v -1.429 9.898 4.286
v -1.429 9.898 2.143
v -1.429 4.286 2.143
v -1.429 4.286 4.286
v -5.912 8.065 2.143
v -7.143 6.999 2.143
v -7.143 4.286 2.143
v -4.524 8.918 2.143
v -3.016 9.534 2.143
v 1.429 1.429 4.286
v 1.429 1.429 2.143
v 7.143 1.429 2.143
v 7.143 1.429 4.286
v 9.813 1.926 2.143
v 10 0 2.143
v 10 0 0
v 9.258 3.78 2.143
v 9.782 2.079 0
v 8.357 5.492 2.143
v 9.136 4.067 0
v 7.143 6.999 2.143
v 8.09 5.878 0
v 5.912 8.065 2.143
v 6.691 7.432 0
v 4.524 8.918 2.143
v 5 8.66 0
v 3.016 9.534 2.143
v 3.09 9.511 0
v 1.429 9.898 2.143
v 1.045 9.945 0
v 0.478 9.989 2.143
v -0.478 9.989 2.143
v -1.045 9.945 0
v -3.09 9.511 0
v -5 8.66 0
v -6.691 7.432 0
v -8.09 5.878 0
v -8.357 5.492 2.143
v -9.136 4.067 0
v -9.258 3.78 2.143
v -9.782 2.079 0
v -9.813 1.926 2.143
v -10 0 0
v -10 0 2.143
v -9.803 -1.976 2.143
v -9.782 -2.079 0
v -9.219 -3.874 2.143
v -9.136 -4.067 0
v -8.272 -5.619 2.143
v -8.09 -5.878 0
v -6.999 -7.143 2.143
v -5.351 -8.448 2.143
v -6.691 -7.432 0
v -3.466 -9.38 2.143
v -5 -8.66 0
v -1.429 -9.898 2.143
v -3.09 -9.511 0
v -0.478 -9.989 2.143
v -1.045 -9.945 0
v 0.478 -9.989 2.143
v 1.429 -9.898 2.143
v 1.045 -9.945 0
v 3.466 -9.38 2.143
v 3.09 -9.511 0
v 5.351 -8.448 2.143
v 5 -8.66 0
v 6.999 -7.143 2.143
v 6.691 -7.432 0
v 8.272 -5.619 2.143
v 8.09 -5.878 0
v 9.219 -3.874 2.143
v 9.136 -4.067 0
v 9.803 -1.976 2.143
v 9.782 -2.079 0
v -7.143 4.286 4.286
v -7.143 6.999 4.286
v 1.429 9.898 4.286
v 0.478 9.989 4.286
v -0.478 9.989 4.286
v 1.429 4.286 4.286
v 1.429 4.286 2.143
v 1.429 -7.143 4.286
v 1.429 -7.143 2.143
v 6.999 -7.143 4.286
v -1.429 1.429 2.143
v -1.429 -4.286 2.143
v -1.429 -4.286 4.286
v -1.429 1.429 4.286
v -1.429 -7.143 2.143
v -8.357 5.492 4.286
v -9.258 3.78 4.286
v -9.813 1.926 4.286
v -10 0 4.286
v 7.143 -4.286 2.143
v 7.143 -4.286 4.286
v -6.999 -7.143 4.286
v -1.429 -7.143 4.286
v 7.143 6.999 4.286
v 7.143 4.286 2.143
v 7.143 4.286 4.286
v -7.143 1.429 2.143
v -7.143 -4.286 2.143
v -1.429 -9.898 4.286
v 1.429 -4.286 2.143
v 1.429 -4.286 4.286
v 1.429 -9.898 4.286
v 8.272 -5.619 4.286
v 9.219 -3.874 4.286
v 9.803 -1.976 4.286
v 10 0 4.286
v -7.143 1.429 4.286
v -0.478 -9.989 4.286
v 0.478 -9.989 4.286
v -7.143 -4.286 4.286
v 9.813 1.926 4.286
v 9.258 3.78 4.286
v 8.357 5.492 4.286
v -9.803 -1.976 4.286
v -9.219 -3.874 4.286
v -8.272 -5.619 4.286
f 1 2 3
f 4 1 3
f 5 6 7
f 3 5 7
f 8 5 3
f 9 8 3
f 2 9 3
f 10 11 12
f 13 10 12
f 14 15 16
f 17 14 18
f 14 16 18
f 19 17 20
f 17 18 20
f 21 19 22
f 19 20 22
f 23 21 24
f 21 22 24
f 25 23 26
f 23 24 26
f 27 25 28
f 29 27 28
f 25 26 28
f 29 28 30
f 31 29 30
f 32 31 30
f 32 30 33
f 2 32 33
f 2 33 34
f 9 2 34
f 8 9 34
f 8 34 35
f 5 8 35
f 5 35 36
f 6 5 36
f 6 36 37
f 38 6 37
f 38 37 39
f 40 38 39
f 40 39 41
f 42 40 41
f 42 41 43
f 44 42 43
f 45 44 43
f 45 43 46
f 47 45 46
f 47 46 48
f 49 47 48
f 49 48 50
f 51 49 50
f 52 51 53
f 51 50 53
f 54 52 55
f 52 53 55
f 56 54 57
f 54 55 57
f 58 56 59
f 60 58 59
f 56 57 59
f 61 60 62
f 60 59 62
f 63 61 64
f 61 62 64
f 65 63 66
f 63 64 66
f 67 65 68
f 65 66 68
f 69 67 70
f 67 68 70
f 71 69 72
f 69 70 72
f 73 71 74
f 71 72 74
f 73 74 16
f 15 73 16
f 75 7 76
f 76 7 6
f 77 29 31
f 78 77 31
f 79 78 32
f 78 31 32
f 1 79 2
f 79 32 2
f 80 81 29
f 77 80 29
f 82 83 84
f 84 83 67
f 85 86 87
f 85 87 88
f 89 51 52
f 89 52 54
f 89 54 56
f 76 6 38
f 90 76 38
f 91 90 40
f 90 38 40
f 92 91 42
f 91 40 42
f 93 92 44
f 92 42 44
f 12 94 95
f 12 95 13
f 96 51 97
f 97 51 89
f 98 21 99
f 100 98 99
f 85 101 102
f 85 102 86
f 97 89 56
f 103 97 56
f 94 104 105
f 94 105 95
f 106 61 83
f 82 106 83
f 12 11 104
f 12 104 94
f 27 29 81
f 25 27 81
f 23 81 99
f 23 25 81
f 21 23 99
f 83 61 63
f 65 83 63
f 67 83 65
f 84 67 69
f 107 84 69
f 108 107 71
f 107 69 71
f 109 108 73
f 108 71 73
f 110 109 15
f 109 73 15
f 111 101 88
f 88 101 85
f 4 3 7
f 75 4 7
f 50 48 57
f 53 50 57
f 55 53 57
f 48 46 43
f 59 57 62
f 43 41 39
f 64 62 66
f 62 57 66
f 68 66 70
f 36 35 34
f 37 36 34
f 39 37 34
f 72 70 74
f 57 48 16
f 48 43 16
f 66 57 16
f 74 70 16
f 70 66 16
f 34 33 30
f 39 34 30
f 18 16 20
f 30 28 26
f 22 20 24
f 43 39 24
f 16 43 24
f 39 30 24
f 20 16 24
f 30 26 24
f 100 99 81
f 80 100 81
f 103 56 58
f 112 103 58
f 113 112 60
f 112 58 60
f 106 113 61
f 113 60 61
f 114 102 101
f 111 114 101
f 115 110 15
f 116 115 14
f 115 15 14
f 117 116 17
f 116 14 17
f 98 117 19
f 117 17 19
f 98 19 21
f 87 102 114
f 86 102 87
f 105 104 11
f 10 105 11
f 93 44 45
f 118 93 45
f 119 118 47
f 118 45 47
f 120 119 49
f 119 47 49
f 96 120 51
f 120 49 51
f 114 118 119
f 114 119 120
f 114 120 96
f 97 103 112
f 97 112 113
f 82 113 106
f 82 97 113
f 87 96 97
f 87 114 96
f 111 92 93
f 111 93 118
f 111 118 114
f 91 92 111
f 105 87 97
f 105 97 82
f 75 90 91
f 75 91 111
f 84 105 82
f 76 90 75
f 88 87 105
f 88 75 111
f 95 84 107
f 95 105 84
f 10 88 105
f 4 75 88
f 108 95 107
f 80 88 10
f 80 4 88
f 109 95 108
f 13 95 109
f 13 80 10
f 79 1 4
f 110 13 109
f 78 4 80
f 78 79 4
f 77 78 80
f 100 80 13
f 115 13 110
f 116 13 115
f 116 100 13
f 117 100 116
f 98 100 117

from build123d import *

# Parameters (mm, degrees)
F0_R     = 14
F1_DEPTH = 3
F2_W     = 8
F2_H     = 8
F3_DEPTH = 3
F4_SCALE = 0.7143


with BuildPart() as f1:
    # F0 (on Top) → F1 (new body)
    with BuildSketch(Plane.XY):
        Circle(F0_R)
    extrude(amount=F1_DEPTH)

    # F2 (on face) → F3 (join)
    with BuildSketch(Plane.XY.offset(3)):
        with BuildLine():
            Line((-10, 6), (-10, 9.7979589711))
            ThreePointArc((-10, 9.7979589711), (-12.9614813968, 5.2915026221), (-14, 0))
            ThreePointArc((-14, 0), (-12.9068087767, -5.4234940031), (-9.7979589711, -10))
            Line((-9.7979589711, -10), (-2, -10))
            Line((-2, -10), (-2, -13.8564064606))
            ThreePointArc((-2, -13.8564064606), (0, -14), (2, -13.8564064606))
            Line((2, -13.8564064606), (2, -10))
            Line((2, -10), (9.7979589711, -10))
            ThreePointArc((9.7979589711, -10), (12.9068087767, -5.4234940031), (14, 0))
            ThreePointArc((14, 0), (12.9614813968, 5.2915026221), (10, 9.7979589711))
            Line((10, 9.7979589711), (10, 6))
            Line((10, 6), (2, 6))
            Line((2, 6), (2, 13.8564064606))
            ThreePointArc((2, 13.8564064606), (0, 14), (-2, 13.8564064606))
            Line((-2, 13.8564064606), (-2, 6))
            Line((-2, 6), (-10, 6))
        make_face()
        with Locations((-6, -2)):
            Rectangle(F2_W, F2_H, mode=Mode.SUBTRACT)
        with Locations((6, -2)):
            Rectangle(F2_W, F2_H, mode=Mode.SUBTRACT)
    extrude(amount=F3_DEPTH)


with BuildPart() as f1_1:
    # F4: moved
    add(f1.part.scale(F4_SCALE))


solid = f1_1.part
